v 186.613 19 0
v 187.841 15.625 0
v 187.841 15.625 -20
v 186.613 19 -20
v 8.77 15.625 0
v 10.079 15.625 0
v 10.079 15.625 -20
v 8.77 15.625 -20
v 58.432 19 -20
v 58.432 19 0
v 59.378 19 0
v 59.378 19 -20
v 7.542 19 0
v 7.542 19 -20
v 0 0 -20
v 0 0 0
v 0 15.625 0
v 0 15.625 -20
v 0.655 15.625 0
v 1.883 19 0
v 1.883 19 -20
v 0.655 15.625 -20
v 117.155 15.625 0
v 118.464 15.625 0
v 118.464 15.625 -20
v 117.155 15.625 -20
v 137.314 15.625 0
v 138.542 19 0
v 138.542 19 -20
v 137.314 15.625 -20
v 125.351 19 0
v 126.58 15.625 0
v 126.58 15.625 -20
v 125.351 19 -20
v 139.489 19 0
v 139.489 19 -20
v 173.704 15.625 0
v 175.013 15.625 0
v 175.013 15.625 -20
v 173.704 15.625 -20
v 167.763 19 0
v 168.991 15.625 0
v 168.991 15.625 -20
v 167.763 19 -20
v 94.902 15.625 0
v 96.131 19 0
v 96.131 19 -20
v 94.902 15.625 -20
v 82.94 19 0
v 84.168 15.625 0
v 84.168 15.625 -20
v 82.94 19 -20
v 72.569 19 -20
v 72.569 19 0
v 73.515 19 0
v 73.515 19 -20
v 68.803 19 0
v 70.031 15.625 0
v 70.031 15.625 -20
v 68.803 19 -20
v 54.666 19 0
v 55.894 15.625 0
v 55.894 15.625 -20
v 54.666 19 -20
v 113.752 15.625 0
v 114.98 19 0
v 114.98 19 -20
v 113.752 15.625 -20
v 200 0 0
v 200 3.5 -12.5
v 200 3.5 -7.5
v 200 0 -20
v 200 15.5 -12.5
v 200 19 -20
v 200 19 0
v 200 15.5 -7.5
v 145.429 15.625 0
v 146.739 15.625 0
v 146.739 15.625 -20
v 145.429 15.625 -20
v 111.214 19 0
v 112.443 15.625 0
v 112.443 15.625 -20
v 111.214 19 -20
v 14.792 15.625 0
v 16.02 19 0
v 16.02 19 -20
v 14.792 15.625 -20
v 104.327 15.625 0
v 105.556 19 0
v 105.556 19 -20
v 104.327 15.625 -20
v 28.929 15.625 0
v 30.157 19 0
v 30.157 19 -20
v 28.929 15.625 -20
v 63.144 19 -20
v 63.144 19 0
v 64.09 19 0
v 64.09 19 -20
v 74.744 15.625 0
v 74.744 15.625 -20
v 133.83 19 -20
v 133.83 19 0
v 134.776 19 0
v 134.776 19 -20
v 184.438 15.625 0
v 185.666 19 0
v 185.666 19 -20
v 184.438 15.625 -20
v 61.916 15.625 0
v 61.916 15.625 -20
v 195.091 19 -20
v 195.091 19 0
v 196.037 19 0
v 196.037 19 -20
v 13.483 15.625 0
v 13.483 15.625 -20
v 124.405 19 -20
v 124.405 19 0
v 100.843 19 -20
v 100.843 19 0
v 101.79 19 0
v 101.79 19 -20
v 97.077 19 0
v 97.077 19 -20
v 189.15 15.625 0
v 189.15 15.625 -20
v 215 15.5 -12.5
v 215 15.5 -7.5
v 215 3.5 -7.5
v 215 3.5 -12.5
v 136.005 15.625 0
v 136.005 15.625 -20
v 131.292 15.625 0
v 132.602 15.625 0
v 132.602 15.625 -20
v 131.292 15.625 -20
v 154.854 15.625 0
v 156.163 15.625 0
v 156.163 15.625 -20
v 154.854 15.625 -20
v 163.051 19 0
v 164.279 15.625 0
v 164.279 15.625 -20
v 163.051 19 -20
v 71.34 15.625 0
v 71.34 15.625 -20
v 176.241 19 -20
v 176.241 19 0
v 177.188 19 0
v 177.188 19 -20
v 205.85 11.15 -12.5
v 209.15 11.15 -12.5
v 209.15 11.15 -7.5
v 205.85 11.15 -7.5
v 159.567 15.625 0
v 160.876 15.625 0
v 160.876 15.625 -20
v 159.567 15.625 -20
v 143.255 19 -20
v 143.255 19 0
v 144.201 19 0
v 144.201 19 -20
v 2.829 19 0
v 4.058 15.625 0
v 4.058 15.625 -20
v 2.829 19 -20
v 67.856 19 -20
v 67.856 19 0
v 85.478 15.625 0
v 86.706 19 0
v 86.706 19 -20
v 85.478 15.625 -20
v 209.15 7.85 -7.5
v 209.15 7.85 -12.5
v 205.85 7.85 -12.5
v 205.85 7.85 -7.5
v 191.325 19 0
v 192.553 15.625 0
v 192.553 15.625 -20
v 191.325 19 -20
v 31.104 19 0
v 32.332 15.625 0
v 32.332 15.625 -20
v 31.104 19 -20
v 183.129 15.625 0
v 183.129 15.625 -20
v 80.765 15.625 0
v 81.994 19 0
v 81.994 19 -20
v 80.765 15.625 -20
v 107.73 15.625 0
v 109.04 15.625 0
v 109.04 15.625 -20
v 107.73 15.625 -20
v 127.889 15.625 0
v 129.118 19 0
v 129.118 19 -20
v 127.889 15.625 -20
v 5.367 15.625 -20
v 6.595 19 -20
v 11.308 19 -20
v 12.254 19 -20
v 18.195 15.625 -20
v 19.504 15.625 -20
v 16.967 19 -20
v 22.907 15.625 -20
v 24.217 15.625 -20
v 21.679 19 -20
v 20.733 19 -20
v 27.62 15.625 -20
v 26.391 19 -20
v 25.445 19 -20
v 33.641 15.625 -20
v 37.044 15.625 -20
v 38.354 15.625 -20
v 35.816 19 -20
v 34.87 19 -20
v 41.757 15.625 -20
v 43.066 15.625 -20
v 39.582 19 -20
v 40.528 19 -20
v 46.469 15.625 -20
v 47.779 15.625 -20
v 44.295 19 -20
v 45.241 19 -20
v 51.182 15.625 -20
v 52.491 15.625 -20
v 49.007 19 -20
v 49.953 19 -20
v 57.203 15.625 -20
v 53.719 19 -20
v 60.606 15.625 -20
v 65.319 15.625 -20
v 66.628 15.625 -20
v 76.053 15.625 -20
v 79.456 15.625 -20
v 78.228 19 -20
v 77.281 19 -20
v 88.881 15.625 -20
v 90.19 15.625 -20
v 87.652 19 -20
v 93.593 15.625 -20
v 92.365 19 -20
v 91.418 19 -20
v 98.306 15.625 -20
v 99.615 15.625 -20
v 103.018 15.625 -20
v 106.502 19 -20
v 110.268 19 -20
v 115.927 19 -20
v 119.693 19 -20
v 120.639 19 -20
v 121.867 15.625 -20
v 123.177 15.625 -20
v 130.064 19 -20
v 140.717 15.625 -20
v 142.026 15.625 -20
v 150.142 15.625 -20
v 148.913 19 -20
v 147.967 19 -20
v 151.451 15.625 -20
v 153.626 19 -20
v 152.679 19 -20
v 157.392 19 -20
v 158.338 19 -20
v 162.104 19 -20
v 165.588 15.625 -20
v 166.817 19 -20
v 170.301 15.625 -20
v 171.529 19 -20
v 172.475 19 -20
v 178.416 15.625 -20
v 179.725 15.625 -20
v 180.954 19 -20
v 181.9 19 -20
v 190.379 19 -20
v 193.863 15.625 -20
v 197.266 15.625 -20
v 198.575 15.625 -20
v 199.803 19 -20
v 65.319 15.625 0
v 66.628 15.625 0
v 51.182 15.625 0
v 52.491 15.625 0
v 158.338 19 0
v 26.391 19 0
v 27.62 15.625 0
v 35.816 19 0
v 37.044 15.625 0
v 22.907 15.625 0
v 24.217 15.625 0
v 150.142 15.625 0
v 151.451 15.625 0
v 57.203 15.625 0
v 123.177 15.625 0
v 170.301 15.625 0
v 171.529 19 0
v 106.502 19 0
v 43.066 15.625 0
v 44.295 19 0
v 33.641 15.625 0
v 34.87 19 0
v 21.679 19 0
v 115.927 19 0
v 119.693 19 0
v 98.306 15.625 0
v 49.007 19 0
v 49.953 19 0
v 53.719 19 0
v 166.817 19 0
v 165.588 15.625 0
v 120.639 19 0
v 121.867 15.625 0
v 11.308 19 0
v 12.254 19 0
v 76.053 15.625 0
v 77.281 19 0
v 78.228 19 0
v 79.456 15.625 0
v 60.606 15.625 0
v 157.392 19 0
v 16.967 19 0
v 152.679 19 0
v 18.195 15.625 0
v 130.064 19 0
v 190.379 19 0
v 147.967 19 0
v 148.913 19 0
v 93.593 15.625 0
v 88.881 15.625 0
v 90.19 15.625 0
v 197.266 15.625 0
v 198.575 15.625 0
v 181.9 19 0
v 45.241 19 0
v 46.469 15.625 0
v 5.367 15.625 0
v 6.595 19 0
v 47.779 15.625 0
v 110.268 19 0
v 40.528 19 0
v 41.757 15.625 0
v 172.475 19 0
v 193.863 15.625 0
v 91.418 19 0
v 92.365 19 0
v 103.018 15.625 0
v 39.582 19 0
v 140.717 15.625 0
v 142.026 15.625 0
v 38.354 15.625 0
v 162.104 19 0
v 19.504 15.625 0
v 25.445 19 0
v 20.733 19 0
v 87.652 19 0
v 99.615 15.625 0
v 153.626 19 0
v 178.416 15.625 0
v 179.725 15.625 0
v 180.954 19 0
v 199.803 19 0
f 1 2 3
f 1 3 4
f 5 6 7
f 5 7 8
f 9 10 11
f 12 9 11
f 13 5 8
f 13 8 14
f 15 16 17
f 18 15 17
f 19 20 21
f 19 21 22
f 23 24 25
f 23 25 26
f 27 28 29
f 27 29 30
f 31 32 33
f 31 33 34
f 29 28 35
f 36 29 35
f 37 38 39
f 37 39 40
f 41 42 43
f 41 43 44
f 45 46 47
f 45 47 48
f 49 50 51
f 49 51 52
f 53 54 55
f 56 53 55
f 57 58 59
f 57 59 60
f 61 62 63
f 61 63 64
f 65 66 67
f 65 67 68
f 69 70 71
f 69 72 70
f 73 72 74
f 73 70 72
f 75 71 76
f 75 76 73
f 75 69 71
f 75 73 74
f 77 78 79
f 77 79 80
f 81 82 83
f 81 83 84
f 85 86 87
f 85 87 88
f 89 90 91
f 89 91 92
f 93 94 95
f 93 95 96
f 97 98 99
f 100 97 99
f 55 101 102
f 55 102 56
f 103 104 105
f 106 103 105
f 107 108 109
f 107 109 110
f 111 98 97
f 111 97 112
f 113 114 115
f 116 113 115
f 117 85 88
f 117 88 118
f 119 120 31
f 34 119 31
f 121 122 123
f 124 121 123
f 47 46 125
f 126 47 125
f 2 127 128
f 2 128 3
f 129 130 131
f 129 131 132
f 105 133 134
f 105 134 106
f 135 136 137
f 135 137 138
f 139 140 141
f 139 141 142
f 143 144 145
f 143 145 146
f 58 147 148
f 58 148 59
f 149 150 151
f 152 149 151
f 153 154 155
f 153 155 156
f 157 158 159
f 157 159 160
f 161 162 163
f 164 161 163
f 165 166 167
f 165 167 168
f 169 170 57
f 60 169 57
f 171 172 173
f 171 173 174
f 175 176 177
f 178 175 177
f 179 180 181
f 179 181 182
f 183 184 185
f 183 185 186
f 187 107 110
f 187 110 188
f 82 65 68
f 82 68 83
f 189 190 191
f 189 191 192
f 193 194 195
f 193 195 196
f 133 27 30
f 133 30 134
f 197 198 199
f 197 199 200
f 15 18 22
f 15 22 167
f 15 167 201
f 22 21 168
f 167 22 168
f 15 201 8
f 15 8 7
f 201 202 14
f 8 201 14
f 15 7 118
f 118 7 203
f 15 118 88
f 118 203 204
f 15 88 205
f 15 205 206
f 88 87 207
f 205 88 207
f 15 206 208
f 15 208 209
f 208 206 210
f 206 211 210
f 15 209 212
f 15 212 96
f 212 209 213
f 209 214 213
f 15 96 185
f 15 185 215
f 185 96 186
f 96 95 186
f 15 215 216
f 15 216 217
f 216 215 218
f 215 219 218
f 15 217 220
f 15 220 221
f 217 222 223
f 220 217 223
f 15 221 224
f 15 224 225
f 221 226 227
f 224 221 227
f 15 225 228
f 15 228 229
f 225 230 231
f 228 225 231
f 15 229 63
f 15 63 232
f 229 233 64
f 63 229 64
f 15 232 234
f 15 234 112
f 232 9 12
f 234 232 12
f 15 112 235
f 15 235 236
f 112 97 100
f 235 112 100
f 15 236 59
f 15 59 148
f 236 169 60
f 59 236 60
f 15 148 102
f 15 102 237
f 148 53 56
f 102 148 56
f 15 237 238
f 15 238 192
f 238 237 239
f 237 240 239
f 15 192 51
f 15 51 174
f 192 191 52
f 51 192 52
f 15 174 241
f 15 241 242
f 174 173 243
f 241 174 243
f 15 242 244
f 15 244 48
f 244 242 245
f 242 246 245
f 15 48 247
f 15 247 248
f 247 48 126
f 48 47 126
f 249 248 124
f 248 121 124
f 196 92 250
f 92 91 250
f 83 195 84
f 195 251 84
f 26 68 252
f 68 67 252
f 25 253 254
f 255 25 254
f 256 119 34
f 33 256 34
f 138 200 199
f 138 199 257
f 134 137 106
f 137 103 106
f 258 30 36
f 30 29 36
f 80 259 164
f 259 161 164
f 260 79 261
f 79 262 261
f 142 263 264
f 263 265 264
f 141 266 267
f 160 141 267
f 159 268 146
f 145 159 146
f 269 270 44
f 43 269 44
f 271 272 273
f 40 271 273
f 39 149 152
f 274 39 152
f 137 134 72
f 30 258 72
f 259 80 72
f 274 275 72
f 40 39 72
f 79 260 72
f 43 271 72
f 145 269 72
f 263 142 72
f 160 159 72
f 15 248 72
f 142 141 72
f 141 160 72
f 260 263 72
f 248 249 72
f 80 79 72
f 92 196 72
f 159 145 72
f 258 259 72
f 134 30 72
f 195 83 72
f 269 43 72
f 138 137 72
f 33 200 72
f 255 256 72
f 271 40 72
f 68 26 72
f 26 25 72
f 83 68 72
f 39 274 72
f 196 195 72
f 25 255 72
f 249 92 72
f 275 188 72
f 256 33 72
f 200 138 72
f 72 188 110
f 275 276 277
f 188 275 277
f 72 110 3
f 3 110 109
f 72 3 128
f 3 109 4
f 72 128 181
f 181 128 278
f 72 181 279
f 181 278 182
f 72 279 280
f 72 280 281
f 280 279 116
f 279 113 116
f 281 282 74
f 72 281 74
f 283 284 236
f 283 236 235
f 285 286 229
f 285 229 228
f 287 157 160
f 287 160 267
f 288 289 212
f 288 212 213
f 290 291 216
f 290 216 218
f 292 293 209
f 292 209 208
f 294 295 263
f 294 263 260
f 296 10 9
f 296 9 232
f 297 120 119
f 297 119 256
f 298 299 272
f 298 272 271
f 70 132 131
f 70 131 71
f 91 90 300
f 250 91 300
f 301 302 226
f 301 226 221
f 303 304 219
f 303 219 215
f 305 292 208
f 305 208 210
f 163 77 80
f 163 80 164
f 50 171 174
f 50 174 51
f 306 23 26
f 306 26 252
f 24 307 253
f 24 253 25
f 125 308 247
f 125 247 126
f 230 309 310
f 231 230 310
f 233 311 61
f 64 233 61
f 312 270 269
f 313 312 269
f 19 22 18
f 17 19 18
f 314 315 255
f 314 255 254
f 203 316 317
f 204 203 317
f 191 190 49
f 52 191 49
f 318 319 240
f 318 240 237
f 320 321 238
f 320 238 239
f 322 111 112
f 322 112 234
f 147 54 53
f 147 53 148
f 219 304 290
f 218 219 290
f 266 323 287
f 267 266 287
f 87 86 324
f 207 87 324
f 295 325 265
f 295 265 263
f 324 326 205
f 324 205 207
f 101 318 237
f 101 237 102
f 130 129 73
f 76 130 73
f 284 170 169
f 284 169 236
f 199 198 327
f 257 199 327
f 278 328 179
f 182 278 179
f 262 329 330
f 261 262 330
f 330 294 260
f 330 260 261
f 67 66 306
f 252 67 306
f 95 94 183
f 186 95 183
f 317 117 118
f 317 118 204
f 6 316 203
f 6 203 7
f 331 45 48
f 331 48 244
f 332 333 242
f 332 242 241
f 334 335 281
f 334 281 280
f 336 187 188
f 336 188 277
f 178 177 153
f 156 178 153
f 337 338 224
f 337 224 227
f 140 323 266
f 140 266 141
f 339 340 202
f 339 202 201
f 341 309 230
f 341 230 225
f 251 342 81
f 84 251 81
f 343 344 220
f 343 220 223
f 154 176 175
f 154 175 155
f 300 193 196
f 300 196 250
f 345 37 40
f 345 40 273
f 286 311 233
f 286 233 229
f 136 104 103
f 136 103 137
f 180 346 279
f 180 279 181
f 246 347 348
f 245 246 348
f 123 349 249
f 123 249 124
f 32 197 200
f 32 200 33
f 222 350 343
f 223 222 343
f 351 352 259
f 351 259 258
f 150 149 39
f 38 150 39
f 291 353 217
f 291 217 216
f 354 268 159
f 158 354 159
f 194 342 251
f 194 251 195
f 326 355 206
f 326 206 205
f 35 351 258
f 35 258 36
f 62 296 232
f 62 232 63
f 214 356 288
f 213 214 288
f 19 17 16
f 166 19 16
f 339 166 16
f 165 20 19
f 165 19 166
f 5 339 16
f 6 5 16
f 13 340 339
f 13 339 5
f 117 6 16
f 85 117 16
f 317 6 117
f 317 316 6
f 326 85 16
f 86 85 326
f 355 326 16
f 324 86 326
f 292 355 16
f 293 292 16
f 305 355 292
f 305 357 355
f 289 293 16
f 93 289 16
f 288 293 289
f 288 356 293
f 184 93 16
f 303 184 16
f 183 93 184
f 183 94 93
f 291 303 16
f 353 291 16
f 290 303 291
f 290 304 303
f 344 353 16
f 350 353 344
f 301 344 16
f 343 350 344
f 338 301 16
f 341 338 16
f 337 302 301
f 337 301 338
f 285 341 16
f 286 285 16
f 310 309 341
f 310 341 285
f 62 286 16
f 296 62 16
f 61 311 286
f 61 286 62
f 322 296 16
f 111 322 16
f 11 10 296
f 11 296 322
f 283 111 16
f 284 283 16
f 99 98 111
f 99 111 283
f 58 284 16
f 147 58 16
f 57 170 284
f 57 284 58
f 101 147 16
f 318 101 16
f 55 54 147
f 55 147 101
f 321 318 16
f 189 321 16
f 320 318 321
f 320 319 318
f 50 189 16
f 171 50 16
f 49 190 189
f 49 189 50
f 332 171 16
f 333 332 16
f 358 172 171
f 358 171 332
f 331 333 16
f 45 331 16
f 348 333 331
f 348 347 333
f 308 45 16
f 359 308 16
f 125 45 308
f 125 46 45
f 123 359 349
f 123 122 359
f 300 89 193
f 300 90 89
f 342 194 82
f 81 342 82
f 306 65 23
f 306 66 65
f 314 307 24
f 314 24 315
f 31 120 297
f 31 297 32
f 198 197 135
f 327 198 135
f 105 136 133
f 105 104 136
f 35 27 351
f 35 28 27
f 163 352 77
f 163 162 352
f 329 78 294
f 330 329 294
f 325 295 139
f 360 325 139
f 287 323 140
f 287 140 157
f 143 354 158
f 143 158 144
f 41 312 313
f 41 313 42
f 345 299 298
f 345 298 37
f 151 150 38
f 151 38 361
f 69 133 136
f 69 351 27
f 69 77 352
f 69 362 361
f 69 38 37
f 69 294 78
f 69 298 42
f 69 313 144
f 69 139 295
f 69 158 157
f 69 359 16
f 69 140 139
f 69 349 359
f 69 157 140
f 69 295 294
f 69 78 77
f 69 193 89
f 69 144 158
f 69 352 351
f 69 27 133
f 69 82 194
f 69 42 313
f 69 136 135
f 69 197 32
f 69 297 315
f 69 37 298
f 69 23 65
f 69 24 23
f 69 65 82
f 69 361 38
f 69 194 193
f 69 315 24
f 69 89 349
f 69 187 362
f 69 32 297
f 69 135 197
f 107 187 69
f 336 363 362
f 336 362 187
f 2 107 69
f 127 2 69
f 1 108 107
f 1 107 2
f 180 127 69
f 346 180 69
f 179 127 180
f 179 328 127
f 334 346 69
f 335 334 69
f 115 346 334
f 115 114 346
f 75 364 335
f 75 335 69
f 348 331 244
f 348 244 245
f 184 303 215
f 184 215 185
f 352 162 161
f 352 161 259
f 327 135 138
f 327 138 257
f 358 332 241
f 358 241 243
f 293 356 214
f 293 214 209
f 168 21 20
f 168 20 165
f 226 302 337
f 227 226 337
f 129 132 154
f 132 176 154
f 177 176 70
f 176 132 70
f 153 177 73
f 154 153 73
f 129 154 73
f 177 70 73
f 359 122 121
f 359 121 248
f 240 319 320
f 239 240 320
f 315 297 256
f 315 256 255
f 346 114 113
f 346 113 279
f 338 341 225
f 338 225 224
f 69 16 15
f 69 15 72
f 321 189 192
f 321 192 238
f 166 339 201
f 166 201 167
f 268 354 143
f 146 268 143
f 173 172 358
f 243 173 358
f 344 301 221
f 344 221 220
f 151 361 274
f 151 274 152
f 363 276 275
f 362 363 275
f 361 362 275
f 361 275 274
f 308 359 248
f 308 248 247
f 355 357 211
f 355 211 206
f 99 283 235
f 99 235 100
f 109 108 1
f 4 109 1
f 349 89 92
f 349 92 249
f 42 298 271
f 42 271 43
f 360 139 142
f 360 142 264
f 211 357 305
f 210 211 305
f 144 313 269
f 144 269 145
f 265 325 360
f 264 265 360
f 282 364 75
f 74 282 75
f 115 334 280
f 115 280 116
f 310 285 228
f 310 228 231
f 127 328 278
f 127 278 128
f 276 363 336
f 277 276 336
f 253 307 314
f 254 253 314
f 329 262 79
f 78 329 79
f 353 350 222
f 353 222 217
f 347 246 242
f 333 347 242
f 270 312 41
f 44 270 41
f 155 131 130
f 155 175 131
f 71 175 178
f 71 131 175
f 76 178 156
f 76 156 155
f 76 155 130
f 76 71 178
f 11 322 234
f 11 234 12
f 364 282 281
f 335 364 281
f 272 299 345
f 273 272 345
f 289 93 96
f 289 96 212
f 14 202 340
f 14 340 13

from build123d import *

# Parameters (mm, degrees)
BLANKSKE_W          = 200
BLANKSKE_H          = 19
BLANK_DEPTH         = 20
TOOTHCUTSIM_DEPTH   = 202.893536301
TEETHCUTS_COUNT     = 43
TEETHCUTS_PITCH     = 4.712388975
SKETCH1_W           = 5
SKETCH1_H           = 19
BOSS_EXTRUDE1_DEPTH = 15
SKETCH2_W           = 15
SKETCH2_H           = 3.5
SKETCH2_W_2         = 3.3
SKETCH2_H_2         = 3.3
CUT_EXTRUDE1_DEPTH  = 5


with BuildPart() as part:
    # BlankSke → Blank (new body)
    with BuildSketch(Plane.XY):
        with Locations((100, 9.5)):
            Rectangle(BLANKSKE_W, BLANKSKE_H)
    extrude(amount=-BLANK_DEPTH)

    # TooCutSkeSim → ToothCutSim (cut, through all)
    with BuildSketch(Plane.XY):
        Polygon((0.654653055, 15.625), (-0.654653055, 15.625), (-1.892297439, 19.0254), (1.892297439, 19.0254), align=None)
    toothcutsim = extrude(amount=-TOOTHCUTSIM_DEPTH, mode=Mode.SUBTRACT)

    # TeethCuts: ToothCutSim ×43
    with Locations(*[(i * TEETHCUTS_PITCH, 0, 0) for i in range(1, TEETHCUTS_COUNT)]):
        add(toothcutsim, mode=Mode.SUBTRACT)

    # Sketch1 → Boss-Extrude1 (add)
    with BuildSketch(Plane(origin=(200, 0, 0), x_dir=(0, 0, -1), z_dir=(1, 0, 0))):
        with Locations((10, 9.5)):
            Rectangle(SKETCH1_W, SKETCH1_H)
    extrude(amount=BOSS_EXTRUDE1_DEPTH)

    # Sketch2 → Cut-Extrude1 (cut)
    with BuildSketch(Plane(origin=(0, 0, -12.5), x_dir=(-1, 0, 0), z_dir=(0, 0, -1))):
        with Locations((-207.5, 17.25)):
            Rectangle(SKETCH2_W, SKETCH2_H)
        with Locations((-207.5, 1.75)):
            Rectangle(SKETCH2_W, SKETCH2_H)
        with Locations((-207.5, 9.5)):
            Rectangle(SKETCH2_W_2, SKETCH2_H_2)
    extrude(amount=-CUT_EXTRUDE1_DEPTH, mode=Mode.SUBTRACT)


solid = part.part
